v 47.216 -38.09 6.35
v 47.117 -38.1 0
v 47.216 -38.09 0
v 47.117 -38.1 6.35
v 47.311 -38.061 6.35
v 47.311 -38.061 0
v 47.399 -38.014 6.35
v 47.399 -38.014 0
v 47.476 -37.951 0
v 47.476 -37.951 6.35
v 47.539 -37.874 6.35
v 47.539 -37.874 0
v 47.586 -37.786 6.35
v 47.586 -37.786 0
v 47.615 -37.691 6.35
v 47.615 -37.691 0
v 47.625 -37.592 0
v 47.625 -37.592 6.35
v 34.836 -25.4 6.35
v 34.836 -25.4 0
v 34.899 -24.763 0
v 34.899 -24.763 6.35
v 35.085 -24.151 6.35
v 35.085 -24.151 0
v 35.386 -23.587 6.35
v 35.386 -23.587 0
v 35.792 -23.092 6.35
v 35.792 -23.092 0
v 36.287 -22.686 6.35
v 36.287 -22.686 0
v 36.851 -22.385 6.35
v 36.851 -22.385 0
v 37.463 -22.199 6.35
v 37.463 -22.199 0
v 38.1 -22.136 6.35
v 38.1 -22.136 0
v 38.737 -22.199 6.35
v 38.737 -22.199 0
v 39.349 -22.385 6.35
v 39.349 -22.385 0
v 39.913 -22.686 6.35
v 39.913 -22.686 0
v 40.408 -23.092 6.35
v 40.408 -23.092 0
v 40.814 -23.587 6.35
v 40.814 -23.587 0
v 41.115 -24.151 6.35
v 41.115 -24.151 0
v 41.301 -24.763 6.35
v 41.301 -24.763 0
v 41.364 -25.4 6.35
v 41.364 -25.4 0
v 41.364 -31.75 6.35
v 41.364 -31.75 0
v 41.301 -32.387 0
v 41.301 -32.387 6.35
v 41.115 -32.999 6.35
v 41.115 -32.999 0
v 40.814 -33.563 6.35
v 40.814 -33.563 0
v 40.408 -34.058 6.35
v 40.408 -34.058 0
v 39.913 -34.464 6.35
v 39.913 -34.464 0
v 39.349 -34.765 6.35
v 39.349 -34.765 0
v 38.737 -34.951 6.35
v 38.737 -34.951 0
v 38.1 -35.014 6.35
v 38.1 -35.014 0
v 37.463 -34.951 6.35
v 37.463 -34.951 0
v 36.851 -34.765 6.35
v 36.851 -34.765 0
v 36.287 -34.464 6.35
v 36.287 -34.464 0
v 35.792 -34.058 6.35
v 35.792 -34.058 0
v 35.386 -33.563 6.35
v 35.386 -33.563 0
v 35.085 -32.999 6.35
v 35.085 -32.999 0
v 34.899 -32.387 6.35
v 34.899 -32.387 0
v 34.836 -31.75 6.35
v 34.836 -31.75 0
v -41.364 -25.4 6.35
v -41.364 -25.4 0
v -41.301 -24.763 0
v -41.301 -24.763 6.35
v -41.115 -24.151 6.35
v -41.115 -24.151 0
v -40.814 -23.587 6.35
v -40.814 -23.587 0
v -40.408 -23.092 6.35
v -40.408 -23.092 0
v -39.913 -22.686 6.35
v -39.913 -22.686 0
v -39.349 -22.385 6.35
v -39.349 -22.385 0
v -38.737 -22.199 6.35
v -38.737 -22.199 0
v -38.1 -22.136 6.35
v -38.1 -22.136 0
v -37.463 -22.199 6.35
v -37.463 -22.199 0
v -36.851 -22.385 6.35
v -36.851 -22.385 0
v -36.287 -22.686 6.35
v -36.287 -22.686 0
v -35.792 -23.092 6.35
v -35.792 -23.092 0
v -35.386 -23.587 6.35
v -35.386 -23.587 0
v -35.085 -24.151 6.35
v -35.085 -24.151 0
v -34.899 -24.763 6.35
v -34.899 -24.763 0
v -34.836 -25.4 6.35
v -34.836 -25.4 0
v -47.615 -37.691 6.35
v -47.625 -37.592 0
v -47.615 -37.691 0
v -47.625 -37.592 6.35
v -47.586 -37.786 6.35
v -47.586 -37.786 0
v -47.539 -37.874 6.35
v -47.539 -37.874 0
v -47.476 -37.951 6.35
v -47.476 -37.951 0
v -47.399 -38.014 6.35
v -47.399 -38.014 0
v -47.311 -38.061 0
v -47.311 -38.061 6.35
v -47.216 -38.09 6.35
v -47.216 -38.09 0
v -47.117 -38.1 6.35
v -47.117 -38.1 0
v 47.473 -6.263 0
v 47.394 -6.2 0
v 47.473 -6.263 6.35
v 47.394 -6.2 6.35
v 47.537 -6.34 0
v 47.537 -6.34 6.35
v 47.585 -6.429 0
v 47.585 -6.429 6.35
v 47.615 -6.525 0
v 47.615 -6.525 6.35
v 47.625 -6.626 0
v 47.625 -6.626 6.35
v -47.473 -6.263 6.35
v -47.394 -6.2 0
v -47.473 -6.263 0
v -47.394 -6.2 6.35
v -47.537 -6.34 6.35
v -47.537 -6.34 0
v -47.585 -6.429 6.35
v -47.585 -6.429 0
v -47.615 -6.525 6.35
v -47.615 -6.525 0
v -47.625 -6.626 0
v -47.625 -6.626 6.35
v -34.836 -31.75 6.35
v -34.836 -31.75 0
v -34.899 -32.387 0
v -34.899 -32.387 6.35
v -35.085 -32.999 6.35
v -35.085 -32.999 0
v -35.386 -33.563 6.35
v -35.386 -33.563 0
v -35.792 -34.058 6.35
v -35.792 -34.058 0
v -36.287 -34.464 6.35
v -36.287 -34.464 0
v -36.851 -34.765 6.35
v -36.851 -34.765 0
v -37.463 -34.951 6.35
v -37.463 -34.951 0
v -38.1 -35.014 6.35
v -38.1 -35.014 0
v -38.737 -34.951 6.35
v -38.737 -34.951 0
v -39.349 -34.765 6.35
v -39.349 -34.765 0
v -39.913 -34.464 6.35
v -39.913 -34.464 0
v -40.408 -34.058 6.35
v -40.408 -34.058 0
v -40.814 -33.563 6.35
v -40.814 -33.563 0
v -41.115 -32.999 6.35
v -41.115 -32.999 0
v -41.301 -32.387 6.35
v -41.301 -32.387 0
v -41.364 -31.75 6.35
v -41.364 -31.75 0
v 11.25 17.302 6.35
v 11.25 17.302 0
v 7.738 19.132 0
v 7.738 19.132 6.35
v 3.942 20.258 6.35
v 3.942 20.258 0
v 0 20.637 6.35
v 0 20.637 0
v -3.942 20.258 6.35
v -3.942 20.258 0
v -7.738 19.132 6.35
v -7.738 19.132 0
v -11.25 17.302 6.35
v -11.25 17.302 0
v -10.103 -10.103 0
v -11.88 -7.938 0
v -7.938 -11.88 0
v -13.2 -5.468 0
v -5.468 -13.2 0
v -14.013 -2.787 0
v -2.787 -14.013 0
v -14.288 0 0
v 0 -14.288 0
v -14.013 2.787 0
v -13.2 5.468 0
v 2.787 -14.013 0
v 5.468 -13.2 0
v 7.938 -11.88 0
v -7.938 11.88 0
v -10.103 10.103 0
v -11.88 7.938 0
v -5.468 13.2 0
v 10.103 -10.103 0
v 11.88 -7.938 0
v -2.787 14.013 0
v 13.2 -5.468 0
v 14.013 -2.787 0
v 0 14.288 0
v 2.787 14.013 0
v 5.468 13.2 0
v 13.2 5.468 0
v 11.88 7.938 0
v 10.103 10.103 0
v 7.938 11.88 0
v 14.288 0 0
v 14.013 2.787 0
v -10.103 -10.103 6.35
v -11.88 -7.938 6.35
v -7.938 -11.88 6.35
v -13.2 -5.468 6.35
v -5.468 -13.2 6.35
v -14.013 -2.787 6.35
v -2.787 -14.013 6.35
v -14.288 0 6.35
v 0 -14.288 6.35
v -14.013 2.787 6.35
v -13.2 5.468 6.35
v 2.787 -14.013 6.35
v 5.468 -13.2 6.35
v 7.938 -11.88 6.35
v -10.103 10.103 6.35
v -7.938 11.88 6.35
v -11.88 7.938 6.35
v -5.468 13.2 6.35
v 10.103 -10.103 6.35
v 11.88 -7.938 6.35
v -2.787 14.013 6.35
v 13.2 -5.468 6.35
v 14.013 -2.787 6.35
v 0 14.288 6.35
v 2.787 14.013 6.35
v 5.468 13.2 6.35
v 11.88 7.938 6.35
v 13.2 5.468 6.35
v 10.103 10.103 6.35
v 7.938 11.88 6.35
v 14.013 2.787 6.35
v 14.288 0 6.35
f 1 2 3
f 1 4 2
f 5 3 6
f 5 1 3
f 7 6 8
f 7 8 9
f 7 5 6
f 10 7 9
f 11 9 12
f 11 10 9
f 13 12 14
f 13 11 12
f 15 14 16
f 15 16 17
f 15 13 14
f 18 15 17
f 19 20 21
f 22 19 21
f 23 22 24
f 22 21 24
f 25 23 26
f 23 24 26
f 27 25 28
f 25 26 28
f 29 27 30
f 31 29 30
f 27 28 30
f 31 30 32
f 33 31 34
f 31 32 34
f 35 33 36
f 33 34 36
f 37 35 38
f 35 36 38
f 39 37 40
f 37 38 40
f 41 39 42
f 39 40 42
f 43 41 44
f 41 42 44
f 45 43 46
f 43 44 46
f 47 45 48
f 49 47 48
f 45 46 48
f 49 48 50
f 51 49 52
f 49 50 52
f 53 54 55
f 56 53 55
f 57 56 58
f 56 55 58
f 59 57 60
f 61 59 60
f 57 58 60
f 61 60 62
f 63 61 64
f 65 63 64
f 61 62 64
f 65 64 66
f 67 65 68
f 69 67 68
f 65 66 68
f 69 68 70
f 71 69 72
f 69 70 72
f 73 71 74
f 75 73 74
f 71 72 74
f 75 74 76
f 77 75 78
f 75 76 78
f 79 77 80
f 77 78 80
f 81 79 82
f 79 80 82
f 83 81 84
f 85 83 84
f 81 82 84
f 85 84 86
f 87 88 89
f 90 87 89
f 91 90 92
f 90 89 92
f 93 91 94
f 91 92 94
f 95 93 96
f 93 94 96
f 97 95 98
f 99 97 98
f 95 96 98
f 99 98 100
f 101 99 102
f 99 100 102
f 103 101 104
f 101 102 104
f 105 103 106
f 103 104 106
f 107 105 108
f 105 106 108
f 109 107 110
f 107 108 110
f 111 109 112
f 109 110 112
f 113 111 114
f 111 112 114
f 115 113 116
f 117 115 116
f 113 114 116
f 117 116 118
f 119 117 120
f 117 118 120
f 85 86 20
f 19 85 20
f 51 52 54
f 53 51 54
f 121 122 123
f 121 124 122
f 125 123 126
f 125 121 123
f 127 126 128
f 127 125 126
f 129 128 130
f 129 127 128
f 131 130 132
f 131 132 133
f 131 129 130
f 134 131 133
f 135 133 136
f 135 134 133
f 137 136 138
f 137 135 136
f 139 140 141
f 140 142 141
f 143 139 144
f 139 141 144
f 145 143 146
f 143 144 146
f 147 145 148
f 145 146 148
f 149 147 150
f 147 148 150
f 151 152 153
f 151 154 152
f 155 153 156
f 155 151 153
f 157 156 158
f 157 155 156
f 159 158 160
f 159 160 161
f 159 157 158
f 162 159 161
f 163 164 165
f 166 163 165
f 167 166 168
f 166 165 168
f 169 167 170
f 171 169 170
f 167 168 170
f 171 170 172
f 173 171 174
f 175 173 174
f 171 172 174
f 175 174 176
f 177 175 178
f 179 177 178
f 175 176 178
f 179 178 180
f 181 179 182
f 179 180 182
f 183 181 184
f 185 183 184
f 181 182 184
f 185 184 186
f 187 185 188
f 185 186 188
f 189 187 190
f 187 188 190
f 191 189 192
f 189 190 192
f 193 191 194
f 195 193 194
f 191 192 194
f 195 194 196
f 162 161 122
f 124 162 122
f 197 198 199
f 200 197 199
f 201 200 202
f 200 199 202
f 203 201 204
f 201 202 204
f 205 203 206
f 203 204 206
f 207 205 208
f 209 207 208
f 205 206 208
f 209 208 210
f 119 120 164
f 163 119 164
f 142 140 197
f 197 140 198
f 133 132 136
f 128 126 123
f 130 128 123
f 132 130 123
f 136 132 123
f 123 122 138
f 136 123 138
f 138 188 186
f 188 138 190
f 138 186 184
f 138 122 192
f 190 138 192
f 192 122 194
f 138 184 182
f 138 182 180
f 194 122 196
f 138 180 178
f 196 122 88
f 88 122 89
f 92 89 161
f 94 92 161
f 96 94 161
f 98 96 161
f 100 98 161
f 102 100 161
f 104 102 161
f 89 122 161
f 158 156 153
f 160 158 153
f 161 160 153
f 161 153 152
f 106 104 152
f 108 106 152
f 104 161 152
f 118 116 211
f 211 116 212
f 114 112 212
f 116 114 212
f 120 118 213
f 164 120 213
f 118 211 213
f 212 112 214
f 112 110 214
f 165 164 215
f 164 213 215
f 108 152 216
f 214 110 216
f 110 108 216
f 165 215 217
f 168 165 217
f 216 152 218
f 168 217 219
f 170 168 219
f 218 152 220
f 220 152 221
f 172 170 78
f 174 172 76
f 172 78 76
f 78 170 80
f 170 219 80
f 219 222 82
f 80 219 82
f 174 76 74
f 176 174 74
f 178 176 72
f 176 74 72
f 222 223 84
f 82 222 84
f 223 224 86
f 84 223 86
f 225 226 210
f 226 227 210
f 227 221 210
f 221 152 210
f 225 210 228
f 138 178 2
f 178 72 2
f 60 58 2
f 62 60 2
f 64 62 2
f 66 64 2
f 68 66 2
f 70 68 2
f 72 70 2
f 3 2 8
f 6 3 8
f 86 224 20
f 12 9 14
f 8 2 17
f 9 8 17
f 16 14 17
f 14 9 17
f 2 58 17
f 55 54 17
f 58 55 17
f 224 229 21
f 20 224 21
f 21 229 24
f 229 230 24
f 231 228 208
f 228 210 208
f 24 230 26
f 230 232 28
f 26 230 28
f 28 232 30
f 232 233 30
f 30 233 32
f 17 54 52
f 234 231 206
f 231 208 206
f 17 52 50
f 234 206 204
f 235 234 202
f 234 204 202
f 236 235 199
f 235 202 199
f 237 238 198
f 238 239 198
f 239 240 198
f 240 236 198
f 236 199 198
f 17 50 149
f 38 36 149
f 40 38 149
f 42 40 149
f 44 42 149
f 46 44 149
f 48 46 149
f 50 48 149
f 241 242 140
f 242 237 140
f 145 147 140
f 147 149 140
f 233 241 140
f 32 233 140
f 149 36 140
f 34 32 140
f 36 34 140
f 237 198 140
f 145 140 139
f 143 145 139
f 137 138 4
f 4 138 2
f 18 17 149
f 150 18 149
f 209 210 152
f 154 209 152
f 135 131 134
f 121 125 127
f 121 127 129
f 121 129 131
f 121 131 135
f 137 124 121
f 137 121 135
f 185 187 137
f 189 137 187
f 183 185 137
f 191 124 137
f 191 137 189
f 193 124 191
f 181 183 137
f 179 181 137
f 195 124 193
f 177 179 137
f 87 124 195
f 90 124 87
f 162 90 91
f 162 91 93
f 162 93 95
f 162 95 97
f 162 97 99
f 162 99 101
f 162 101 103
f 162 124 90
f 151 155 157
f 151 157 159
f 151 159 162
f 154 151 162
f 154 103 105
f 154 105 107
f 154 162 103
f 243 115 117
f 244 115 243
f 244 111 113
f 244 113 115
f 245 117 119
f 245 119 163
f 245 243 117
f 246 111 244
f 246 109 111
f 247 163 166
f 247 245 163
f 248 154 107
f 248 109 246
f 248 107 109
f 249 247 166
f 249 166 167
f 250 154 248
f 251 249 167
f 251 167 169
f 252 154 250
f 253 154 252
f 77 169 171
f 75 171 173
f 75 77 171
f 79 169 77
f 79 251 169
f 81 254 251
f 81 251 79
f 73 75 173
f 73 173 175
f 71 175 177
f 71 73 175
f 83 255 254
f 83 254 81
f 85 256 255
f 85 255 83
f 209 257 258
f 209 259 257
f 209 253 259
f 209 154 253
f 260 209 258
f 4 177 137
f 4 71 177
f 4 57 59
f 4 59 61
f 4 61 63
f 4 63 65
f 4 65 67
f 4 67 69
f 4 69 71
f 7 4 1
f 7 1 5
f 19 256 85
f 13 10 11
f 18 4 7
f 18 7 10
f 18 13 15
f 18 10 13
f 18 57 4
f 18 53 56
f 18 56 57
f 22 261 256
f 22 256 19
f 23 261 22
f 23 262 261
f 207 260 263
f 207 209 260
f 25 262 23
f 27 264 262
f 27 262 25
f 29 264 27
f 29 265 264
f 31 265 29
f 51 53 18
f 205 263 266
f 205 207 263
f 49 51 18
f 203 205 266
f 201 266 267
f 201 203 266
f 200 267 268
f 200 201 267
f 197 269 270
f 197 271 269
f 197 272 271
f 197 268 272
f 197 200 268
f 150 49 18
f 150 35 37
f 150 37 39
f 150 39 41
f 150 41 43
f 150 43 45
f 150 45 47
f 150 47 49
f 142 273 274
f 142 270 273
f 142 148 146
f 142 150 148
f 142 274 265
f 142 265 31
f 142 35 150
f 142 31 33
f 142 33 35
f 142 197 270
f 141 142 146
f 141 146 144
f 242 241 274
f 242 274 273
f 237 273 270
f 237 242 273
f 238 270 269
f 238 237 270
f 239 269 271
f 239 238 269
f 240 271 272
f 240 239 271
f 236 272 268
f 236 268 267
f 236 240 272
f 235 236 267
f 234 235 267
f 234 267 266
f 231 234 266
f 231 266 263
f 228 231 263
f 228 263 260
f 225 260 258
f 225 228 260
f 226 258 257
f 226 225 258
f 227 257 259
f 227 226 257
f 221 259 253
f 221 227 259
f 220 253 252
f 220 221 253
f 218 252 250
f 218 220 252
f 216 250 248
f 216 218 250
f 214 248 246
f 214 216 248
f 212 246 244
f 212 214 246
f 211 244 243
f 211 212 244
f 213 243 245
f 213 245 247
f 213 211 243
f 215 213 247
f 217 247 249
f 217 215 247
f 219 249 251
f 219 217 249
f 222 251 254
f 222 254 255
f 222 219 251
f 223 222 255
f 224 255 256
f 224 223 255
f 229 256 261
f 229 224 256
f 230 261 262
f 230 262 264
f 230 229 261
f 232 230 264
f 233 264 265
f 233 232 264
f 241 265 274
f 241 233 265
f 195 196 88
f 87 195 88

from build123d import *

# Parameters (mm, degrees)
SKETCH1_R           = 14.2875
BOSS_EXTRUDE1_DEPTH = 6.35
FILLET1_R           = 0.508


with BuildPart() as part:
    # Sketch1 → Boss-Extrude1 (new body)
    with BuildSketch(Plane.XY):
        with BuildLine():
            Line((-11.249807725, 17.301682936), (-47.625, -6.35))
            Line((-47.625, -6.35), (-47.625, -38.1))
            Line((-47.625, -38.1), (47.625, -38.1))
            Line((47.625, -38.1), (47.625, -6.35))
            Line((47.625, -6.35), (11.249807725, 17.301682936))
            ThreePointArc((11.249807725, 17.301682936), (0, 20.6375), (-11.249807725, 17.301682936))
        make_face()
        Circle(SKETCH1_R, mode=Mode.SUBTRACT)
        with BuildLine():
            Line((-34.8361, -25.4), (-34.8361, -31.75))
            ThreePointArc((-34.8361, -31.75), (-38.1, -35.0139), (-41.3639, -31.75))
            Line((-41.3639, -31.75), (-41.3639, -25.4))
            ThreePointArc((-41.3639, -25.4), (-38.1, -22.1361), (-34.8361, -25.4))
        make_face(mode=Mode.SUBTRACT)
        with BuildLine():
            Line((41.3639, -25.4), (41.3639, -31.75))
            ThreePointArc((41.3639, -31.75), (38.1, -35.0139), (34.8361, -31.75))
            Line((34.8361, -31.75), (34.8361, -25.4))
            ThreePointArc((34.8361, -25.4), (38.1, -22.1361), (41.3639, -25.4))
        make_face(mode=Mode.SUBTRACT)
    extrude(amount=BOSS_EXTRUDE1_DEPTH)

    # Fillet1
    fillet1_edges = [part.edges().sort_by_distance(p)[0] for p in [
        (47.625, -6.35, 3.175),
        (47.625, -38.1, 3.175),
        (-47.625, -38.1, 3.175),
        (-47.625, -6.35, 3.175),
    ]]
    fillet(fillet1_edges, radius=FILLET1_R)


solid = part.part
